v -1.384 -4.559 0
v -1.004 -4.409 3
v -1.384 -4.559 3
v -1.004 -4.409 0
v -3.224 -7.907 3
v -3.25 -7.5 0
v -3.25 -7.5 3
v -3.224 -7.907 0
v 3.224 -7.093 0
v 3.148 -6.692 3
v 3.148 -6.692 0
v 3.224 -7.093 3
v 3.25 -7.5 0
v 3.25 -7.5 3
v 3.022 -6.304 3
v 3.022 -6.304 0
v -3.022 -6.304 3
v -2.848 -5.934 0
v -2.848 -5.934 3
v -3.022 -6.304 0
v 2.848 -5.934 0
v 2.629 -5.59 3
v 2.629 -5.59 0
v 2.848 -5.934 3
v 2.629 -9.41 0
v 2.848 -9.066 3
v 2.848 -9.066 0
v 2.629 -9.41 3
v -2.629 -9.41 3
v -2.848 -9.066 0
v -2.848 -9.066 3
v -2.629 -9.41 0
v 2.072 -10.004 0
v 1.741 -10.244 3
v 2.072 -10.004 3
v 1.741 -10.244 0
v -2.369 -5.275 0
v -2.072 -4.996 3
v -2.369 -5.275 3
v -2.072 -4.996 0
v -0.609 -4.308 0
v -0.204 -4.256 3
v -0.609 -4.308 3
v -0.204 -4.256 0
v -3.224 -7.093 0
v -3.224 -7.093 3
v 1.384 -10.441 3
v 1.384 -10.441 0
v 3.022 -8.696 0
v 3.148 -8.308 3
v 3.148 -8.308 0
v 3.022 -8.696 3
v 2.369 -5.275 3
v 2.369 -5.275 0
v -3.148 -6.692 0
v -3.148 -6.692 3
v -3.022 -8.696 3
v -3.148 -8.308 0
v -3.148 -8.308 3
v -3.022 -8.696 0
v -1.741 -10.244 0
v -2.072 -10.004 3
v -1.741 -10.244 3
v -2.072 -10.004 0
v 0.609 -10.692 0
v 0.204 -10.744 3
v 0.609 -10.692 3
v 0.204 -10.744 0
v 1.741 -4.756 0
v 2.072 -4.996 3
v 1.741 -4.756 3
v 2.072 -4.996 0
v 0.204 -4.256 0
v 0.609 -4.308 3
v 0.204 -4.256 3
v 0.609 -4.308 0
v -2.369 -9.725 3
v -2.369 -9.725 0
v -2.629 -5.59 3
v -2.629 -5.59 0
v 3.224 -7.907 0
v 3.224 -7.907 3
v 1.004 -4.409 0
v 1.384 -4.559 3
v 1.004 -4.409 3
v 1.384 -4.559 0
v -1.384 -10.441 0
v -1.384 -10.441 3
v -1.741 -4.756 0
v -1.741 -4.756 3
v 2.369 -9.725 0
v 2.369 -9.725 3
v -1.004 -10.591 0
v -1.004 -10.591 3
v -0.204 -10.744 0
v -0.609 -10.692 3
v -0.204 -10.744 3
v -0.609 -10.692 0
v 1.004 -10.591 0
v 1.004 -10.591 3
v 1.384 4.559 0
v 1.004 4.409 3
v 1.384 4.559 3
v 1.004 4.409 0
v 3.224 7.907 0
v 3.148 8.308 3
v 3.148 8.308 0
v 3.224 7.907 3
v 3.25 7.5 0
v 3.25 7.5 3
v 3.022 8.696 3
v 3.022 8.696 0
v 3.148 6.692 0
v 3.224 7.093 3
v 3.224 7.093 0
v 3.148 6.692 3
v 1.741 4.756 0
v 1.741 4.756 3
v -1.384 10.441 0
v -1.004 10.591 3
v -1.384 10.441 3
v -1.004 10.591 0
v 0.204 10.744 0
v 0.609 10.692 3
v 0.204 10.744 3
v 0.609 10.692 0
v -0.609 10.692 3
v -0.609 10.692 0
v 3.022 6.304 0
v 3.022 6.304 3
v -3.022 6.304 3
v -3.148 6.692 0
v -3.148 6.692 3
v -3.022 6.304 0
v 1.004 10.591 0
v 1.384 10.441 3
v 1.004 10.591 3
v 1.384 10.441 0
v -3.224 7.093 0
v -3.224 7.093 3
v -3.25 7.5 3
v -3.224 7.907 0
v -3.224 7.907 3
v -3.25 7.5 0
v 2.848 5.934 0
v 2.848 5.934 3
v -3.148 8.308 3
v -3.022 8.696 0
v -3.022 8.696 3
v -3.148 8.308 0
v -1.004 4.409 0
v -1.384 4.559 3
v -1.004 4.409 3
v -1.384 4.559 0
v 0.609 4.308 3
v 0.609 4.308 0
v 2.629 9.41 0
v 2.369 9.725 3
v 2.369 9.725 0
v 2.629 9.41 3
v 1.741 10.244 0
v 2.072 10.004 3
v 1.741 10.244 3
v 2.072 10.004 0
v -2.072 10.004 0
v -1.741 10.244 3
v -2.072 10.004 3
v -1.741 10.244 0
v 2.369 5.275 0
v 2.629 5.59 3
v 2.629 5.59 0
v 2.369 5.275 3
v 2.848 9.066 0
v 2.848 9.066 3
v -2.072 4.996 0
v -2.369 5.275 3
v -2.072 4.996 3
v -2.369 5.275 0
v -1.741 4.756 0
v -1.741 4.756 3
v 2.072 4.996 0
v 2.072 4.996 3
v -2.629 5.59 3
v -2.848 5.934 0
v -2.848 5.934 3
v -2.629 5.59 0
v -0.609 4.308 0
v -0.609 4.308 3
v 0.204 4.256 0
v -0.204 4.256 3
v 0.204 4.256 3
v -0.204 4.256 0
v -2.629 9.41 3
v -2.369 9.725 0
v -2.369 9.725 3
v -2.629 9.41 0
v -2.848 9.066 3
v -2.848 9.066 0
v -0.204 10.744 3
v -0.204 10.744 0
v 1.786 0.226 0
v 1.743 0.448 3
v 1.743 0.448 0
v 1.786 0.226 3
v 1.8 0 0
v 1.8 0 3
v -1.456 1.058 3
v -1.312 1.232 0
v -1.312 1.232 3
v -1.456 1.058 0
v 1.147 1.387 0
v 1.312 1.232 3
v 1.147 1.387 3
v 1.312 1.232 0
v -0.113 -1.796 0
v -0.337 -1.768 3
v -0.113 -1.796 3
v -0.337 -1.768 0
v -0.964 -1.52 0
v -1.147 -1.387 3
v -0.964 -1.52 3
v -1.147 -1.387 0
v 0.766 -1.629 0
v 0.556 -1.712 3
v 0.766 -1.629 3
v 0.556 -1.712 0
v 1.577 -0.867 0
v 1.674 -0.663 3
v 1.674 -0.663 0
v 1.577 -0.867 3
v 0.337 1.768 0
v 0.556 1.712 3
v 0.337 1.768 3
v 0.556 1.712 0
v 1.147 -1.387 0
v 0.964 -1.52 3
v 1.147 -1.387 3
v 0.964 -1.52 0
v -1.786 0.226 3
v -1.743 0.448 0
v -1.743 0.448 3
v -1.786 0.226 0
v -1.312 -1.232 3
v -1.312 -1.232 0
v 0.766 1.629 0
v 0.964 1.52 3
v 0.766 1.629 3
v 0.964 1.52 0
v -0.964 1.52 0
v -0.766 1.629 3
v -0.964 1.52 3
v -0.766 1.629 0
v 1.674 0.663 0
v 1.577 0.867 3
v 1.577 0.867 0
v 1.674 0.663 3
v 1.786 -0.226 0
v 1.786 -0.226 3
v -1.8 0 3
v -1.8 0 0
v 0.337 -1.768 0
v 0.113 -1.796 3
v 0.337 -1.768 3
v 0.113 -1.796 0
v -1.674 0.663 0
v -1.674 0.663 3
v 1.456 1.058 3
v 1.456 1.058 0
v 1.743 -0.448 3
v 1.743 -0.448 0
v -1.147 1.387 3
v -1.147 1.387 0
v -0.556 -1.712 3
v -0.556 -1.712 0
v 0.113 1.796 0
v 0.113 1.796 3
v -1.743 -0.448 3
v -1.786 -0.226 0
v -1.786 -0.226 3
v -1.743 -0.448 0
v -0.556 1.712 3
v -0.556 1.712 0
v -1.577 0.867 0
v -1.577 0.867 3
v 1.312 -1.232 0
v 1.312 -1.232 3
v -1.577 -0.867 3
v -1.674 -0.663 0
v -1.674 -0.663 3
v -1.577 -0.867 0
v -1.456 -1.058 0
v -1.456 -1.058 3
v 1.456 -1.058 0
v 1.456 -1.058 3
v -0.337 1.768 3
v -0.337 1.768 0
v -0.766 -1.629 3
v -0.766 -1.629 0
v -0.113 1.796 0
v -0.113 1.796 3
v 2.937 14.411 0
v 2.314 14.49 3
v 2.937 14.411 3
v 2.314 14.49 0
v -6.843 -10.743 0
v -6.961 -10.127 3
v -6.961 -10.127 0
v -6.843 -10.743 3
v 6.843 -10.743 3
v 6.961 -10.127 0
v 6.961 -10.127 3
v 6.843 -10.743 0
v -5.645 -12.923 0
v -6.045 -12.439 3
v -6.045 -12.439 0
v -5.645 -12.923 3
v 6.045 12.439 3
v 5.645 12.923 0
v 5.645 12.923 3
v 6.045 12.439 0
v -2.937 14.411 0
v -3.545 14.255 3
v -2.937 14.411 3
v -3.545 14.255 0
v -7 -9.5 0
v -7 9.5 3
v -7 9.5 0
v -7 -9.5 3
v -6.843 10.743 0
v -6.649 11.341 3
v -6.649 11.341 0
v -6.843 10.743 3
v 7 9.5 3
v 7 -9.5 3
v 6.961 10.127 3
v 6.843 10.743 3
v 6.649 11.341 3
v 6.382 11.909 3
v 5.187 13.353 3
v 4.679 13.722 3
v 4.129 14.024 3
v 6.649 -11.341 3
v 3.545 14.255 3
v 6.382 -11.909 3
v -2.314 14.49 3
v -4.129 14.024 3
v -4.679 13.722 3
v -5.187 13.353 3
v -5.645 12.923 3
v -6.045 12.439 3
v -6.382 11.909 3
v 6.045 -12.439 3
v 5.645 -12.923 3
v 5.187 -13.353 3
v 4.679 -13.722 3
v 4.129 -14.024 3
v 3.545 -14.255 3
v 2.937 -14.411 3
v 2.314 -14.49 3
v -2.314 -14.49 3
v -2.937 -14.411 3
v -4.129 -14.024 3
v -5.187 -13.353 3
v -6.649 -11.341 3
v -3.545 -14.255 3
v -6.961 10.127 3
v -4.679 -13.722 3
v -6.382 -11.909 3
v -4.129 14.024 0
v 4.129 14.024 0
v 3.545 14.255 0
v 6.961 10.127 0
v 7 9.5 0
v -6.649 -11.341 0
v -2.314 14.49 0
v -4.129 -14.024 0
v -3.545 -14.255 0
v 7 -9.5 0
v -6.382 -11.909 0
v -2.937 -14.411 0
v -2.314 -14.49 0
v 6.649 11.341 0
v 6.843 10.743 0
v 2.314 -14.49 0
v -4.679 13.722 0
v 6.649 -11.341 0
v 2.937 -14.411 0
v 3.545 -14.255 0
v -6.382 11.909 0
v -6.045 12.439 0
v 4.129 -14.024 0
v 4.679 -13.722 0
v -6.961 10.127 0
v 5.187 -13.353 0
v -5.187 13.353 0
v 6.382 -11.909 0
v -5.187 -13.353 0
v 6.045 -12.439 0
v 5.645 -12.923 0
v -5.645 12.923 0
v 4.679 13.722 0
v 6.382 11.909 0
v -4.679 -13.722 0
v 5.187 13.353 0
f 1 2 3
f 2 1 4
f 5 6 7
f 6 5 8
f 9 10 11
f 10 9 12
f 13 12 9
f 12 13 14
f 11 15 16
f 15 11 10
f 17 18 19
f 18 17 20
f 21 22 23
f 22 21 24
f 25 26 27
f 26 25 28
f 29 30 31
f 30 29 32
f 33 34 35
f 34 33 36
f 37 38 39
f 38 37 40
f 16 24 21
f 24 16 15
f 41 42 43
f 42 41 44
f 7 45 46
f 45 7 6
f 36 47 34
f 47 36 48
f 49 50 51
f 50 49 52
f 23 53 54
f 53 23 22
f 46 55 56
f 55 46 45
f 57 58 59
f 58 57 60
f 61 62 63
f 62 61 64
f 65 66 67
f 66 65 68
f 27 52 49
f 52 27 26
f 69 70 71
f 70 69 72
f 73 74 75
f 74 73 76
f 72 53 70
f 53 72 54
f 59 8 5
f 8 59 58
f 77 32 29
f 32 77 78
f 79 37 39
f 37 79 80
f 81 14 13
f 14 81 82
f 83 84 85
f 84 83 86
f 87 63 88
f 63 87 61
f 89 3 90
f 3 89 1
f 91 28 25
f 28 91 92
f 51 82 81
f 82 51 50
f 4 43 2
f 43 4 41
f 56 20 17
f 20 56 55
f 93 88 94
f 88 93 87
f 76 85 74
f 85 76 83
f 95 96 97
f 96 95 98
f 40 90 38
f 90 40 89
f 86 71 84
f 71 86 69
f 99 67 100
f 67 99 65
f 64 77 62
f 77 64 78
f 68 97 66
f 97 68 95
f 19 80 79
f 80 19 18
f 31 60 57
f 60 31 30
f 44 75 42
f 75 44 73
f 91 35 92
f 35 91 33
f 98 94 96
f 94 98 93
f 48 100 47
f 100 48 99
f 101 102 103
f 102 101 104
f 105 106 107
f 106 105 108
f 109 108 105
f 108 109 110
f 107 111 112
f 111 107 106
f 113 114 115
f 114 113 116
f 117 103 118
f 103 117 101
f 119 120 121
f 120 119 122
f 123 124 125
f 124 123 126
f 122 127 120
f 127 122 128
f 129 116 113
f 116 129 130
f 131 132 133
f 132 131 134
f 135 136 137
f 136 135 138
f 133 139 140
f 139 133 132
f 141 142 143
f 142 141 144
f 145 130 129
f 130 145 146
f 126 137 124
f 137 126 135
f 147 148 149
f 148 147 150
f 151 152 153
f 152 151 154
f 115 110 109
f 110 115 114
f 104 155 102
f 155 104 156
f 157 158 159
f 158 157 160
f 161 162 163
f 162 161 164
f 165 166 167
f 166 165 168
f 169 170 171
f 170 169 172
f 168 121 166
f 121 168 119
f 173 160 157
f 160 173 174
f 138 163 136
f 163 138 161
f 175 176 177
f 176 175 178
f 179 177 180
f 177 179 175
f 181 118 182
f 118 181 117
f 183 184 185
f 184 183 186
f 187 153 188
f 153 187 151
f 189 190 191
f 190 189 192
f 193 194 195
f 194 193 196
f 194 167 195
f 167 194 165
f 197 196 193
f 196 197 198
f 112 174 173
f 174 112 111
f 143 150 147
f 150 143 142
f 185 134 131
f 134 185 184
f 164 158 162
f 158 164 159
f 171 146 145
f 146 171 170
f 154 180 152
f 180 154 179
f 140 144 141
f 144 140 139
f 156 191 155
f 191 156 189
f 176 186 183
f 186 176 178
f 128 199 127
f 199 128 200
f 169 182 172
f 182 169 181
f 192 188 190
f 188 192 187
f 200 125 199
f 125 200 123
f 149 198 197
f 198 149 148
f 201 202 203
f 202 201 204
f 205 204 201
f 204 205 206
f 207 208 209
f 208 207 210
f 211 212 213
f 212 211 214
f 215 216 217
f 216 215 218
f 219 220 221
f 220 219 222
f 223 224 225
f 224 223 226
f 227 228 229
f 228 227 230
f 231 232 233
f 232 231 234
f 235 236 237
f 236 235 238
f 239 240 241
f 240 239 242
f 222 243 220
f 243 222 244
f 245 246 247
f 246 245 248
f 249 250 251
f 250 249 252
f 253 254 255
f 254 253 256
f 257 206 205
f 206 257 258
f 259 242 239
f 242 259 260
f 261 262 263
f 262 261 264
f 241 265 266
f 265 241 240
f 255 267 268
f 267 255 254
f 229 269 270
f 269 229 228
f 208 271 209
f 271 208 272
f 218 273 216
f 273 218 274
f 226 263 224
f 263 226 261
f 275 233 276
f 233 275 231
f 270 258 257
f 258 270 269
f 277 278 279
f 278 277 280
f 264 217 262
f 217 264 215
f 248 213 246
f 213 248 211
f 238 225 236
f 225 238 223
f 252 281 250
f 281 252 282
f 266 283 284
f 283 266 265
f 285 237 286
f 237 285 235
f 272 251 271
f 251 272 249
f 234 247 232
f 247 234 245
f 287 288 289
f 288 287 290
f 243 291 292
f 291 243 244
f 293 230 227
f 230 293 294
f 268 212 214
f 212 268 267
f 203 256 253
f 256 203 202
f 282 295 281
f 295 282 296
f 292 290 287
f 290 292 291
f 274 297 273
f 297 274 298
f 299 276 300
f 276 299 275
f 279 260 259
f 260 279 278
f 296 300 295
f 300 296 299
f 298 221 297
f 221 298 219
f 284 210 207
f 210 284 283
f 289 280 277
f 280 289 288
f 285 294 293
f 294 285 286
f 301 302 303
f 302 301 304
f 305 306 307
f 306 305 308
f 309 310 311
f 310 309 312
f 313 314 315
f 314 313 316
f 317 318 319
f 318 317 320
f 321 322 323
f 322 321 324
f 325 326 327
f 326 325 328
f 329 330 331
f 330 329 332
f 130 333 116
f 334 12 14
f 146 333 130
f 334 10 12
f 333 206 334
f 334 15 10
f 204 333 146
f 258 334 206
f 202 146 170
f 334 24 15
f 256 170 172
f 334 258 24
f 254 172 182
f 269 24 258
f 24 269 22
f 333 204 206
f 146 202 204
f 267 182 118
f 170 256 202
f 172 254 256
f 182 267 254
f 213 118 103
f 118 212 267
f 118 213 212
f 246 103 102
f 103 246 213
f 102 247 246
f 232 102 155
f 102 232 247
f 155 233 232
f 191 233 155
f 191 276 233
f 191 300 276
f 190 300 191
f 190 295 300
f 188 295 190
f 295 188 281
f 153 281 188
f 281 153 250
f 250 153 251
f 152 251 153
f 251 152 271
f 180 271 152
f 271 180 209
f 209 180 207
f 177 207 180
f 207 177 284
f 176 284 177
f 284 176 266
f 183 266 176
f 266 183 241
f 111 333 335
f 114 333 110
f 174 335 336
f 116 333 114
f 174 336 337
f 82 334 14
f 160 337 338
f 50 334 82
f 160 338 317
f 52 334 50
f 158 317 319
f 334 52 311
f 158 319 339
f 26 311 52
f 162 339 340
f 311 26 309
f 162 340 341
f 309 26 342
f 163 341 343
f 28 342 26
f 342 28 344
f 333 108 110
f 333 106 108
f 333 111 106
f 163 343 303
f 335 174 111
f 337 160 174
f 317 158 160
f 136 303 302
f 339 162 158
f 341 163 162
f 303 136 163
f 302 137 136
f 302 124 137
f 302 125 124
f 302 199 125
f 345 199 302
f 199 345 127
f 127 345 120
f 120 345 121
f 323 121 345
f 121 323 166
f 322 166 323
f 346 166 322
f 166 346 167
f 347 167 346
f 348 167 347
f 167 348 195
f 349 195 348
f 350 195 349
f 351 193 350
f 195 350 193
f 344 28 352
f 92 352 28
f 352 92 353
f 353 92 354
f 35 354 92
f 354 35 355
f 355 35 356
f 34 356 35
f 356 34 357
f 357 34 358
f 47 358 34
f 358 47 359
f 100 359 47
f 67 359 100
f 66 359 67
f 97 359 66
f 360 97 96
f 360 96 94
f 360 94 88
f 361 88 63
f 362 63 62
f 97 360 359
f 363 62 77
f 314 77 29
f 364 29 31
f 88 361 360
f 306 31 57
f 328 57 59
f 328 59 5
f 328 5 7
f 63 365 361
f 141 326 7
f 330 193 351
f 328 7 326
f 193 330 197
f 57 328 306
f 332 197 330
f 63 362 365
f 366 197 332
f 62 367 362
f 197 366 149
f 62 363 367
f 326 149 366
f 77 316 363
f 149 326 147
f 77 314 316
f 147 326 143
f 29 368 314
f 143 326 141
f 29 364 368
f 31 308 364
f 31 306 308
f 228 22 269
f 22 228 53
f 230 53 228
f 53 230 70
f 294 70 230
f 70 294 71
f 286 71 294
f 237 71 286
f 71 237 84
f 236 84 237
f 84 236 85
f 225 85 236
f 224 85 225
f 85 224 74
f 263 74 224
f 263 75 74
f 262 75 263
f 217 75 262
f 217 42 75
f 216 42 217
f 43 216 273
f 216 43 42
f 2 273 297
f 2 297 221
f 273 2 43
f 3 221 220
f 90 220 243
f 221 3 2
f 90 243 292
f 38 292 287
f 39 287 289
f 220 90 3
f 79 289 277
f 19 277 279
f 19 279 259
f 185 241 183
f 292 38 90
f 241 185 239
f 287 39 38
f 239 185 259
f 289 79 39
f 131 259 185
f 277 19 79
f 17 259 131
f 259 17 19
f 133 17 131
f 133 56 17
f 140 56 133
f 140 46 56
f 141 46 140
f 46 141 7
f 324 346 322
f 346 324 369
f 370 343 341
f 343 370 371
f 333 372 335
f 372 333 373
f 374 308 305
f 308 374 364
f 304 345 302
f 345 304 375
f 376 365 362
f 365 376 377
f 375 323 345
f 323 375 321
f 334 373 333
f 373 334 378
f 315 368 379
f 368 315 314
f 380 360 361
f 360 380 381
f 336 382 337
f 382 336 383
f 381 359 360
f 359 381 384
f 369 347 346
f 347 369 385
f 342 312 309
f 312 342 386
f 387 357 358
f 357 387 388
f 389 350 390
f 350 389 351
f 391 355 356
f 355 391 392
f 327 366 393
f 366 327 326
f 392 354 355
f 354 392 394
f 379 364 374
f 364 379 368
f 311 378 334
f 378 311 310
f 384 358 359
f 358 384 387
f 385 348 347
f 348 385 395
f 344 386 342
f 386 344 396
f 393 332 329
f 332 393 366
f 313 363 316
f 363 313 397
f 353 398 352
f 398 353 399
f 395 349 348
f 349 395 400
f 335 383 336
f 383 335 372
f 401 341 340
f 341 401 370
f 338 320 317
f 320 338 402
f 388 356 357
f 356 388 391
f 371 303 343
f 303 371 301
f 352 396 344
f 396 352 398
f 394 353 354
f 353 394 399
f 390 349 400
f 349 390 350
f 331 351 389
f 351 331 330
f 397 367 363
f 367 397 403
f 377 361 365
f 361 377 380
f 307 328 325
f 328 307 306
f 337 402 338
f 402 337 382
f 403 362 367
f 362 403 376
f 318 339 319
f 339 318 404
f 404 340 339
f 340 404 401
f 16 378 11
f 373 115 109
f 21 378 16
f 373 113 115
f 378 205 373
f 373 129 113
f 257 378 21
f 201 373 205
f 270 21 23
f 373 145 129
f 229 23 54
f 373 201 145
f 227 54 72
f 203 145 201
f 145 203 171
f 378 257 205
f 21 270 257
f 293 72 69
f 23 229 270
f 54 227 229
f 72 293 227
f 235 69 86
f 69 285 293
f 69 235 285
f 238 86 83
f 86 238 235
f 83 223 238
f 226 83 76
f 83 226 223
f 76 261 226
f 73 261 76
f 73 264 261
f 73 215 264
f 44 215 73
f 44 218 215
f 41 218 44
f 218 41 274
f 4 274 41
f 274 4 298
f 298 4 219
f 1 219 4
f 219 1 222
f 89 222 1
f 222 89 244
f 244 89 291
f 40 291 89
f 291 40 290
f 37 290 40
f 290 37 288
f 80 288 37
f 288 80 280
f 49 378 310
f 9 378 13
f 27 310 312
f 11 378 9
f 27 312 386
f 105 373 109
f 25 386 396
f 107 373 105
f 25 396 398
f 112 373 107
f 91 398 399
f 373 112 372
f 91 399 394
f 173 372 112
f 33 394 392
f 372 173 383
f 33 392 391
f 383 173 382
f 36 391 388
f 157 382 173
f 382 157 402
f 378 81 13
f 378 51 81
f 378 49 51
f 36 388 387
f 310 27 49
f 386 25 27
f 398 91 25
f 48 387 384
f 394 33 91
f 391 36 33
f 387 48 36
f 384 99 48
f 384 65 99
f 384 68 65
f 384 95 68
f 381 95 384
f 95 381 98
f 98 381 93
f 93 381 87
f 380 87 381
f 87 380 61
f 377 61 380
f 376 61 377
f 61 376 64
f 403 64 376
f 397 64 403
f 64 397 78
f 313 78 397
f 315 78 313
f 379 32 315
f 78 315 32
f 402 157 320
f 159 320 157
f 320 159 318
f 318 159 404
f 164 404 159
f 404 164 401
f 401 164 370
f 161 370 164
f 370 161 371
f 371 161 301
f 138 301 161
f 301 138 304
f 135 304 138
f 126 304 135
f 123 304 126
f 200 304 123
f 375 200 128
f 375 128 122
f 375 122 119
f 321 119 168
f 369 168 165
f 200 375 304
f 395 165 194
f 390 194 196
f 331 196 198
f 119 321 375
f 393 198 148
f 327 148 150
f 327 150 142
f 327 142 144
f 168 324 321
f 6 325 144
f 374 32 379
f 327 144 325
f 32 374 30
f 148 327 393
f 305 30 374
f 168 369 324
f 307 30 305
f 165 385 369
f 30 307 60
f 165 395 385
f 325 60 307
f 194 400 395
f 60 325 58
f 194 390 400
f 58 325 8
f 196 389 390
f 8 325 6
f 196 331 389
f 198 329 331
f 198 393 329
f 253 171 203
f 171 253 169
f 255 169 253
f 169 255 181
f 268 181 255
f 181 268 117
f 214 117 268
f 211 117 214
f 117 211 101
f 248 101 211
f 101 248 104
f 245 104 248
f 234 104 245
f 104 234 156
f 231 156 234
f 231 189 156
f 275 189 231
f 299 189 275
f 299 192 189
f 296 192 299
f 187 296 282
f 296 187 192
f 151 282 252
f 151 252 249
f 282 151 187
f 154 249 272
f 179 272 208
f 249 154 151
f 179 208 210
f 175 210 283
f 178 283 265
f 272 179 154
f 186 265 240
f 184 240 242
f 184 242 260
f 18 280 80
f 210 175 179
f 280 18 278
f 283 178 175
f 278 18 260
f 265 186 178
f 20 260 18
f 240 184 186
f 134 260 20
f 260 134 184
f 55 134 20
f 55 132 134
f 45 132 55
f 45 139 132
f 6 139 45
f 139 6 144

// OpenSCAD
$fn = 50;

difference() {
	union() {
		hull() {
			translate(v = [-2.0, 9.5, 0]) {
				cylinder(h = 3, r = 5);
			}
			translate(v = [2.0, 9.5, 0]) {
				cylinder(h = 3, r = 5);
			}
			translate(v = [-2.0, -9.5, 0]) {
				cylinder(h = 3, r = 5);
			}
			translate(v = [2.0, -9.5, 0]) {
				cylinder(h = 3, r = 5);
			}
		}
	}
	union() {
		translate(v = [0.0, -7.5, 0]) {
			translate(v = [0, 0, -100]) {
				cylinder(h = 200, r = 3.25);
			}
		}
		translate(v = [0.0, 7.5, 0]) {
			translate(v = [0, 0, -100]) {
				cylinder(h = 200, r = 3.25);
			}
		}
		translate(v = [0.0, -7.5, 0]) {
			translate(v = [0, 0, -100]) {
				cylinder(h = 200, r = 1.8);
			}
		}
		translate(v = [0, 0, -100]) {
			cylinder(h = 200, r = 1.8);
		}
		translate(v = [0.0, 7.5, 0]) {
			translate(v = [0, 0, -100]) {
				cylinder(h = 200, r = 1.8);
			}
		}
	}
}
